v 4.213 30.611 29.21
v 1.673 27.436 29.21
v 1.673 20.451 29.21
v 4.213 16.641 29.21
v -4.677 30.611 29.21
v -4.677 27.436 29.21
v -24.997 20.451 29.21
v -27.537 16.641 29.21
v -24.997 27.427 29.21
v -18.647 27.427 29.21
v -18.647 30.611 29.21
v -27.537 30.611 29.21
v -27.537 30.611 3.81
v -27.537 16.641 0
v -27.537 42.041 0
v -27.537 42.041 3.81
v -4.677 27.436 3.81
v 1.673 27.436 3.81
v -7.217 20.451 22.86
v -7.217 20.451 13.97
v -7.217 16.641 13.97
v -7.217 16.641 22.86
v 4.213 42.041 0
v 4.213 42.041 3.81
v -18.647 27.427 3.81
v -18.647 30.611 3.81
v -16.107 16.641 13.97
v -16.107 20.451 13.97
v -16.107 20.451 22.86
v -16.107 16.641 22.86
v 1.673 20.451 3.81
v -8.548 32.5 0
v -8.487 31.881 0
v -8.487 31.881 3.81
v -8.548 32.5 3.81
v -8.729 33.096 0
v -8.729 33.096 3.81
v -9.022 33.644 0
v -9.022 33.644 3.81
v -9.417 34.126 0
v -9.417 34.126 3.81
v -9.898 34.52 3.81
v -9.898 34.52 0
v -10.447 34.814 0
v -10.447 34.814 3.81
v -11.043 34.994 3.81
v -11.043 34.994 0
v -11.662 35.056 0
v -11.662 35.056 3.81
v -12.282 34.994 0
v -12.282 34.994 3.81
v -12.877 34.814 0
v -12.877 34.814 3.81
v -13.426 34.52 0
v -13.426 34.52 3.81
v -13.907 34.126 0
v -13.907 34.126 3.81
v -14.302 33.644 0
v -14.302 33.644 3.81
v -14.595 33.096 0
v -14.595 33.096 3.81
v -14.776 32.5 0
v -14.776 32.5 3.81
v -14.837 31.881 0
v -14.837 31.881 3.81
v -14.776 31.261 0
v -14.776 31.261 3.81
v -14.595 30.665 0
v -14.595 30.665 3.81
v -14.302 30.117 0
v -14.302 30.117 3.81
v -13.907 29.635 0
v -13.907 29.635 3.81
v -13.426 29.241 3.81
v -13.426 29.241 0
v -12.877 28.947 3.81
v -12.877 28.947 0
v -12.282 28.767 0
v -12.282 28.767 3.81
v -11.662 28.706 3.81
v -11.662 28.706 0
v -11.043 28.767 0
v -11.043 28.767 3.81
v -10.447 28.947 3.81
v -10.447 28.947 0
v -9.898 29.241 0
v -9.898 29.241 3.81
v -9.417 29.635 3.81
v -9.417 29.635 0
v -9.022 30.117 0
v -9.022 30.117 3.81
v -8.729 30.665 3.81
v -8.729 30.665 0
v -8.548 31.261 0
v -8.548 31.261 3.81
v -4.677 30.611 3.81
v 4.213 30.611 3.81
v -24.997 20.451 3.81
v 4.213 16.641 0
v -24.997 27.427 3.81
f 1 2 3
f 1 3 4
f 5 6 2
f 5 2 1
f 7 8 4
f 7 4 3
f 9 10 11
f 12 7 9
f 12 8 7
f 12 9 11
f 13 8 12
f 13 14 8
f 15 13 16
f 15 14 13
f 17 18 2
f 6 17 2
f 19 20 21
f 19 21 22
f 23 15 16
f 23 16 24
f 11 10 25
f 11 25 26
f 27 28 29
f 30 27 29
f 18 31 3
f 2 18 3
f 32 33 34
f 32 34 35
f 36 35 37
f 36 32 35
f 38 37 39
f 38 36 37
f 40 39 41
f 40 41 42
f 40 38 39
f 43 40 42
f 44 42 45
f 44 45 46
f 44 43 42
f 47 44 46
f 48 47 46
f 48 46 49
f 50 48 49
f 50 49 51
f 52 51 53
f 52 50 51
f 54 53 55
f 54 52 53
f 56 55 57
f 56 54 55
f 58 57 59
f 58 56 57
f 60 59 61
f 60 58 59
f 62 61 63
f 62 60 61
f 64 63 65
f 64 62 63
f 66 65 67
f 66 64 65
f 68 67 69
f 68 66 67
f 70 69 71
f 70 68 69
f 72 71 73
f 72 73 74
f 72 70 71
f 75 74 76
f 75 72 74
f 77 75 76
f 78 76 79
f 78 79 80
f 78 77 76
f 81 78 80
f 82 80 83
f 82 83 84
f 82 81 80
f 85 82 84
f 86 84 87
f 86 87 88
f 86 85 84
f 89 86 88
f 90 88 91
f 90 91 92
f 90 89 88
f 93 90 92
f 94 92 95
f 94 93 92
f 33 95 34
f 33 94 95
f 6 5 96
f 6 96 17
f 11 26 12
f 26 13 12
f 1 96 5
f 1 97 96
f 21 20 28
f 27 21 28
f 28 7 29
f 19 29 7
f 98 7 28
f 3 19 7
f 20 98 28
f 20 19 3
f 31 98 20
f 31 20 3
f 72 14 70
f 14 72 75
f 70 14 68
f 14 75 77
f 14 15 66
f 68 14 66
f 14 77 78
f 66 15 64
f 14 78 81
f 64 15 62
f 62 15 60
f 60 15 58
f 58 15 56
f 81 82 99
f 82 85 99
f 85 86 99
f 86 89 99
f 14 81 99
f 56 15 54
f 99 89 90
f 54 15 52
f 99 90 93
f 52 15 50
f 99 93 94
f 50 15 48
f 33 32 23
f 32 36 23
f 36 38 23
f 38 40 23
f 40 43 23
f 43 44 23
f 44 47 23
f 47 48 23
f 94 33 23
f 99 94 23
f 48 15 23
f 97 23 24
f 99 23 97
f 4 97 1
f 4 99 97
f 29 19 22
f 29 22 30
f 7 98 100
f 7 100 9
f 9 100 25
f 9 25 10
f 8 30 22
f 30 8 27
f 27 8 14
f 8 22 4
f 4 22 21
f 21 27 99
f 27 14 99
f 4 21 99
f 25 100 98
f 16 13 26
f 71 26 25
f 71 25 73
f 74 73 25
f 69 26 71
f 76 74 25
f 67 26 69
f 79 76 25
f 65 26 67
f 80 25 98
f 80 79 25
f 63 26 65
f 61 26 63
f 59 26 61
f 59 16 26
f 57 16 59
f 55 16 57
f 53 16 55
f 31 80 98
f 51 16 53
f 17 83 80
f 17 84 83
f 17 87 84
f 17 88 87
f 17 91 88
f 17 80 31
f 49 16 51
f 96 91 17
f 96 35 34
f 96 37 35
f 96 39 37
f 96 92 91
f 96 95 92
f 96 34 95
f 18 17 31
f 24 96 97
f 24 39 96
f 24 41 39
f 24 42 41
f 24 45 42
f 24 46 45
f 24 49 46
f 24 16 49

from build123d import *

# Parameters (mm, degrees)
F0_W      = 31.75
F0_H      = 25.4
F0_R      = 3.175
F1_DEPTH  = 3.81
F2_W      = 31.75
F2_H      = 3.81
F3_DEPTH  = 25.4
F4_W      = 2.54
F4_H      = 25.4
F5_DEPTH  = 10.16
F4_W_2    = 8.89
F4_H_2    = 8.89
F6_DEPTH  = 25.4
F8_W      = 3.175
F8_H      = 25.4
F9_DEPTH  = 6.35
F7_W      = 3.18363
F7_H      = 25.4
F10_DEPTH = 6.35


with BuildPart() as f1:
    # F0 (on Top) → F1 (new body)
    with BuildSketch(Plane.XY):
        with Locations((-11.662145, 29.340504)):
            Rectangle(F0_W, F0_H)
        with Locations((-11.662145, 31.880504)):
            Circle(F0_R, mode=Mode.SUBTRACT)
    extrude(amount=F1_DEPTH)

    # F2 (on face) → F3 (join)
    with BuildSketch(Plane.XY.offset(3.81)):
        with Locations((-11.662145, 18.545504)):
            Rectangle(F2_W, F2_H)
    extrude(amount=F3_DEPTH)

    # F4 (on face) → F5 (join)
    with BuildSketch(Plane(origin=(0, 20.450504, 0), x_dir=(-1, 0, 0), z_dir=(0, 1, 0))):
        with Locations((-2.942855, 16.51)):
            Rectangle(F4_W, F4_H)
        with Locations((26.267145, 16.51)):
            Rectangle(F4_W, F4_H)
    extrude(amount=F5_DEPTH)

    # F4 (on face) → F6 (cut)
    with BuildSketch(Plane(origin=(0, 20.450504, 0), x_dir=(-1, 0, 0), z_dir=(0, 1, 0))):
        with Locations((11.662145, 18.415)):
            Rectangle(F4_W_2, F4_H_2)
    extrude(amount=-F6_DEPTH, mode=Mode.SUBTRACT)

    # F8 (on face) → F9 (join)
    with BuildSketch(Plane(origin=(1.672855, 0, 0), x_dir=(0, -1, 0), z_dir=(-1, 0, 0))):
        with Locations((-29.023004, 16.51)):
            Rectangle(F8_W, F8_H)
    extrude(amount=F9_DEPTH)

    # F7 (on face) → F10 (join)
    with BuildSketch(Plane.YZ.offset(-24.997145)):
        with Locations((29.018689, 16.51)):
            Rectangle(F7_W, F7_H)
    extrude(amount=F10_DEPTH)


solid = f1.part
